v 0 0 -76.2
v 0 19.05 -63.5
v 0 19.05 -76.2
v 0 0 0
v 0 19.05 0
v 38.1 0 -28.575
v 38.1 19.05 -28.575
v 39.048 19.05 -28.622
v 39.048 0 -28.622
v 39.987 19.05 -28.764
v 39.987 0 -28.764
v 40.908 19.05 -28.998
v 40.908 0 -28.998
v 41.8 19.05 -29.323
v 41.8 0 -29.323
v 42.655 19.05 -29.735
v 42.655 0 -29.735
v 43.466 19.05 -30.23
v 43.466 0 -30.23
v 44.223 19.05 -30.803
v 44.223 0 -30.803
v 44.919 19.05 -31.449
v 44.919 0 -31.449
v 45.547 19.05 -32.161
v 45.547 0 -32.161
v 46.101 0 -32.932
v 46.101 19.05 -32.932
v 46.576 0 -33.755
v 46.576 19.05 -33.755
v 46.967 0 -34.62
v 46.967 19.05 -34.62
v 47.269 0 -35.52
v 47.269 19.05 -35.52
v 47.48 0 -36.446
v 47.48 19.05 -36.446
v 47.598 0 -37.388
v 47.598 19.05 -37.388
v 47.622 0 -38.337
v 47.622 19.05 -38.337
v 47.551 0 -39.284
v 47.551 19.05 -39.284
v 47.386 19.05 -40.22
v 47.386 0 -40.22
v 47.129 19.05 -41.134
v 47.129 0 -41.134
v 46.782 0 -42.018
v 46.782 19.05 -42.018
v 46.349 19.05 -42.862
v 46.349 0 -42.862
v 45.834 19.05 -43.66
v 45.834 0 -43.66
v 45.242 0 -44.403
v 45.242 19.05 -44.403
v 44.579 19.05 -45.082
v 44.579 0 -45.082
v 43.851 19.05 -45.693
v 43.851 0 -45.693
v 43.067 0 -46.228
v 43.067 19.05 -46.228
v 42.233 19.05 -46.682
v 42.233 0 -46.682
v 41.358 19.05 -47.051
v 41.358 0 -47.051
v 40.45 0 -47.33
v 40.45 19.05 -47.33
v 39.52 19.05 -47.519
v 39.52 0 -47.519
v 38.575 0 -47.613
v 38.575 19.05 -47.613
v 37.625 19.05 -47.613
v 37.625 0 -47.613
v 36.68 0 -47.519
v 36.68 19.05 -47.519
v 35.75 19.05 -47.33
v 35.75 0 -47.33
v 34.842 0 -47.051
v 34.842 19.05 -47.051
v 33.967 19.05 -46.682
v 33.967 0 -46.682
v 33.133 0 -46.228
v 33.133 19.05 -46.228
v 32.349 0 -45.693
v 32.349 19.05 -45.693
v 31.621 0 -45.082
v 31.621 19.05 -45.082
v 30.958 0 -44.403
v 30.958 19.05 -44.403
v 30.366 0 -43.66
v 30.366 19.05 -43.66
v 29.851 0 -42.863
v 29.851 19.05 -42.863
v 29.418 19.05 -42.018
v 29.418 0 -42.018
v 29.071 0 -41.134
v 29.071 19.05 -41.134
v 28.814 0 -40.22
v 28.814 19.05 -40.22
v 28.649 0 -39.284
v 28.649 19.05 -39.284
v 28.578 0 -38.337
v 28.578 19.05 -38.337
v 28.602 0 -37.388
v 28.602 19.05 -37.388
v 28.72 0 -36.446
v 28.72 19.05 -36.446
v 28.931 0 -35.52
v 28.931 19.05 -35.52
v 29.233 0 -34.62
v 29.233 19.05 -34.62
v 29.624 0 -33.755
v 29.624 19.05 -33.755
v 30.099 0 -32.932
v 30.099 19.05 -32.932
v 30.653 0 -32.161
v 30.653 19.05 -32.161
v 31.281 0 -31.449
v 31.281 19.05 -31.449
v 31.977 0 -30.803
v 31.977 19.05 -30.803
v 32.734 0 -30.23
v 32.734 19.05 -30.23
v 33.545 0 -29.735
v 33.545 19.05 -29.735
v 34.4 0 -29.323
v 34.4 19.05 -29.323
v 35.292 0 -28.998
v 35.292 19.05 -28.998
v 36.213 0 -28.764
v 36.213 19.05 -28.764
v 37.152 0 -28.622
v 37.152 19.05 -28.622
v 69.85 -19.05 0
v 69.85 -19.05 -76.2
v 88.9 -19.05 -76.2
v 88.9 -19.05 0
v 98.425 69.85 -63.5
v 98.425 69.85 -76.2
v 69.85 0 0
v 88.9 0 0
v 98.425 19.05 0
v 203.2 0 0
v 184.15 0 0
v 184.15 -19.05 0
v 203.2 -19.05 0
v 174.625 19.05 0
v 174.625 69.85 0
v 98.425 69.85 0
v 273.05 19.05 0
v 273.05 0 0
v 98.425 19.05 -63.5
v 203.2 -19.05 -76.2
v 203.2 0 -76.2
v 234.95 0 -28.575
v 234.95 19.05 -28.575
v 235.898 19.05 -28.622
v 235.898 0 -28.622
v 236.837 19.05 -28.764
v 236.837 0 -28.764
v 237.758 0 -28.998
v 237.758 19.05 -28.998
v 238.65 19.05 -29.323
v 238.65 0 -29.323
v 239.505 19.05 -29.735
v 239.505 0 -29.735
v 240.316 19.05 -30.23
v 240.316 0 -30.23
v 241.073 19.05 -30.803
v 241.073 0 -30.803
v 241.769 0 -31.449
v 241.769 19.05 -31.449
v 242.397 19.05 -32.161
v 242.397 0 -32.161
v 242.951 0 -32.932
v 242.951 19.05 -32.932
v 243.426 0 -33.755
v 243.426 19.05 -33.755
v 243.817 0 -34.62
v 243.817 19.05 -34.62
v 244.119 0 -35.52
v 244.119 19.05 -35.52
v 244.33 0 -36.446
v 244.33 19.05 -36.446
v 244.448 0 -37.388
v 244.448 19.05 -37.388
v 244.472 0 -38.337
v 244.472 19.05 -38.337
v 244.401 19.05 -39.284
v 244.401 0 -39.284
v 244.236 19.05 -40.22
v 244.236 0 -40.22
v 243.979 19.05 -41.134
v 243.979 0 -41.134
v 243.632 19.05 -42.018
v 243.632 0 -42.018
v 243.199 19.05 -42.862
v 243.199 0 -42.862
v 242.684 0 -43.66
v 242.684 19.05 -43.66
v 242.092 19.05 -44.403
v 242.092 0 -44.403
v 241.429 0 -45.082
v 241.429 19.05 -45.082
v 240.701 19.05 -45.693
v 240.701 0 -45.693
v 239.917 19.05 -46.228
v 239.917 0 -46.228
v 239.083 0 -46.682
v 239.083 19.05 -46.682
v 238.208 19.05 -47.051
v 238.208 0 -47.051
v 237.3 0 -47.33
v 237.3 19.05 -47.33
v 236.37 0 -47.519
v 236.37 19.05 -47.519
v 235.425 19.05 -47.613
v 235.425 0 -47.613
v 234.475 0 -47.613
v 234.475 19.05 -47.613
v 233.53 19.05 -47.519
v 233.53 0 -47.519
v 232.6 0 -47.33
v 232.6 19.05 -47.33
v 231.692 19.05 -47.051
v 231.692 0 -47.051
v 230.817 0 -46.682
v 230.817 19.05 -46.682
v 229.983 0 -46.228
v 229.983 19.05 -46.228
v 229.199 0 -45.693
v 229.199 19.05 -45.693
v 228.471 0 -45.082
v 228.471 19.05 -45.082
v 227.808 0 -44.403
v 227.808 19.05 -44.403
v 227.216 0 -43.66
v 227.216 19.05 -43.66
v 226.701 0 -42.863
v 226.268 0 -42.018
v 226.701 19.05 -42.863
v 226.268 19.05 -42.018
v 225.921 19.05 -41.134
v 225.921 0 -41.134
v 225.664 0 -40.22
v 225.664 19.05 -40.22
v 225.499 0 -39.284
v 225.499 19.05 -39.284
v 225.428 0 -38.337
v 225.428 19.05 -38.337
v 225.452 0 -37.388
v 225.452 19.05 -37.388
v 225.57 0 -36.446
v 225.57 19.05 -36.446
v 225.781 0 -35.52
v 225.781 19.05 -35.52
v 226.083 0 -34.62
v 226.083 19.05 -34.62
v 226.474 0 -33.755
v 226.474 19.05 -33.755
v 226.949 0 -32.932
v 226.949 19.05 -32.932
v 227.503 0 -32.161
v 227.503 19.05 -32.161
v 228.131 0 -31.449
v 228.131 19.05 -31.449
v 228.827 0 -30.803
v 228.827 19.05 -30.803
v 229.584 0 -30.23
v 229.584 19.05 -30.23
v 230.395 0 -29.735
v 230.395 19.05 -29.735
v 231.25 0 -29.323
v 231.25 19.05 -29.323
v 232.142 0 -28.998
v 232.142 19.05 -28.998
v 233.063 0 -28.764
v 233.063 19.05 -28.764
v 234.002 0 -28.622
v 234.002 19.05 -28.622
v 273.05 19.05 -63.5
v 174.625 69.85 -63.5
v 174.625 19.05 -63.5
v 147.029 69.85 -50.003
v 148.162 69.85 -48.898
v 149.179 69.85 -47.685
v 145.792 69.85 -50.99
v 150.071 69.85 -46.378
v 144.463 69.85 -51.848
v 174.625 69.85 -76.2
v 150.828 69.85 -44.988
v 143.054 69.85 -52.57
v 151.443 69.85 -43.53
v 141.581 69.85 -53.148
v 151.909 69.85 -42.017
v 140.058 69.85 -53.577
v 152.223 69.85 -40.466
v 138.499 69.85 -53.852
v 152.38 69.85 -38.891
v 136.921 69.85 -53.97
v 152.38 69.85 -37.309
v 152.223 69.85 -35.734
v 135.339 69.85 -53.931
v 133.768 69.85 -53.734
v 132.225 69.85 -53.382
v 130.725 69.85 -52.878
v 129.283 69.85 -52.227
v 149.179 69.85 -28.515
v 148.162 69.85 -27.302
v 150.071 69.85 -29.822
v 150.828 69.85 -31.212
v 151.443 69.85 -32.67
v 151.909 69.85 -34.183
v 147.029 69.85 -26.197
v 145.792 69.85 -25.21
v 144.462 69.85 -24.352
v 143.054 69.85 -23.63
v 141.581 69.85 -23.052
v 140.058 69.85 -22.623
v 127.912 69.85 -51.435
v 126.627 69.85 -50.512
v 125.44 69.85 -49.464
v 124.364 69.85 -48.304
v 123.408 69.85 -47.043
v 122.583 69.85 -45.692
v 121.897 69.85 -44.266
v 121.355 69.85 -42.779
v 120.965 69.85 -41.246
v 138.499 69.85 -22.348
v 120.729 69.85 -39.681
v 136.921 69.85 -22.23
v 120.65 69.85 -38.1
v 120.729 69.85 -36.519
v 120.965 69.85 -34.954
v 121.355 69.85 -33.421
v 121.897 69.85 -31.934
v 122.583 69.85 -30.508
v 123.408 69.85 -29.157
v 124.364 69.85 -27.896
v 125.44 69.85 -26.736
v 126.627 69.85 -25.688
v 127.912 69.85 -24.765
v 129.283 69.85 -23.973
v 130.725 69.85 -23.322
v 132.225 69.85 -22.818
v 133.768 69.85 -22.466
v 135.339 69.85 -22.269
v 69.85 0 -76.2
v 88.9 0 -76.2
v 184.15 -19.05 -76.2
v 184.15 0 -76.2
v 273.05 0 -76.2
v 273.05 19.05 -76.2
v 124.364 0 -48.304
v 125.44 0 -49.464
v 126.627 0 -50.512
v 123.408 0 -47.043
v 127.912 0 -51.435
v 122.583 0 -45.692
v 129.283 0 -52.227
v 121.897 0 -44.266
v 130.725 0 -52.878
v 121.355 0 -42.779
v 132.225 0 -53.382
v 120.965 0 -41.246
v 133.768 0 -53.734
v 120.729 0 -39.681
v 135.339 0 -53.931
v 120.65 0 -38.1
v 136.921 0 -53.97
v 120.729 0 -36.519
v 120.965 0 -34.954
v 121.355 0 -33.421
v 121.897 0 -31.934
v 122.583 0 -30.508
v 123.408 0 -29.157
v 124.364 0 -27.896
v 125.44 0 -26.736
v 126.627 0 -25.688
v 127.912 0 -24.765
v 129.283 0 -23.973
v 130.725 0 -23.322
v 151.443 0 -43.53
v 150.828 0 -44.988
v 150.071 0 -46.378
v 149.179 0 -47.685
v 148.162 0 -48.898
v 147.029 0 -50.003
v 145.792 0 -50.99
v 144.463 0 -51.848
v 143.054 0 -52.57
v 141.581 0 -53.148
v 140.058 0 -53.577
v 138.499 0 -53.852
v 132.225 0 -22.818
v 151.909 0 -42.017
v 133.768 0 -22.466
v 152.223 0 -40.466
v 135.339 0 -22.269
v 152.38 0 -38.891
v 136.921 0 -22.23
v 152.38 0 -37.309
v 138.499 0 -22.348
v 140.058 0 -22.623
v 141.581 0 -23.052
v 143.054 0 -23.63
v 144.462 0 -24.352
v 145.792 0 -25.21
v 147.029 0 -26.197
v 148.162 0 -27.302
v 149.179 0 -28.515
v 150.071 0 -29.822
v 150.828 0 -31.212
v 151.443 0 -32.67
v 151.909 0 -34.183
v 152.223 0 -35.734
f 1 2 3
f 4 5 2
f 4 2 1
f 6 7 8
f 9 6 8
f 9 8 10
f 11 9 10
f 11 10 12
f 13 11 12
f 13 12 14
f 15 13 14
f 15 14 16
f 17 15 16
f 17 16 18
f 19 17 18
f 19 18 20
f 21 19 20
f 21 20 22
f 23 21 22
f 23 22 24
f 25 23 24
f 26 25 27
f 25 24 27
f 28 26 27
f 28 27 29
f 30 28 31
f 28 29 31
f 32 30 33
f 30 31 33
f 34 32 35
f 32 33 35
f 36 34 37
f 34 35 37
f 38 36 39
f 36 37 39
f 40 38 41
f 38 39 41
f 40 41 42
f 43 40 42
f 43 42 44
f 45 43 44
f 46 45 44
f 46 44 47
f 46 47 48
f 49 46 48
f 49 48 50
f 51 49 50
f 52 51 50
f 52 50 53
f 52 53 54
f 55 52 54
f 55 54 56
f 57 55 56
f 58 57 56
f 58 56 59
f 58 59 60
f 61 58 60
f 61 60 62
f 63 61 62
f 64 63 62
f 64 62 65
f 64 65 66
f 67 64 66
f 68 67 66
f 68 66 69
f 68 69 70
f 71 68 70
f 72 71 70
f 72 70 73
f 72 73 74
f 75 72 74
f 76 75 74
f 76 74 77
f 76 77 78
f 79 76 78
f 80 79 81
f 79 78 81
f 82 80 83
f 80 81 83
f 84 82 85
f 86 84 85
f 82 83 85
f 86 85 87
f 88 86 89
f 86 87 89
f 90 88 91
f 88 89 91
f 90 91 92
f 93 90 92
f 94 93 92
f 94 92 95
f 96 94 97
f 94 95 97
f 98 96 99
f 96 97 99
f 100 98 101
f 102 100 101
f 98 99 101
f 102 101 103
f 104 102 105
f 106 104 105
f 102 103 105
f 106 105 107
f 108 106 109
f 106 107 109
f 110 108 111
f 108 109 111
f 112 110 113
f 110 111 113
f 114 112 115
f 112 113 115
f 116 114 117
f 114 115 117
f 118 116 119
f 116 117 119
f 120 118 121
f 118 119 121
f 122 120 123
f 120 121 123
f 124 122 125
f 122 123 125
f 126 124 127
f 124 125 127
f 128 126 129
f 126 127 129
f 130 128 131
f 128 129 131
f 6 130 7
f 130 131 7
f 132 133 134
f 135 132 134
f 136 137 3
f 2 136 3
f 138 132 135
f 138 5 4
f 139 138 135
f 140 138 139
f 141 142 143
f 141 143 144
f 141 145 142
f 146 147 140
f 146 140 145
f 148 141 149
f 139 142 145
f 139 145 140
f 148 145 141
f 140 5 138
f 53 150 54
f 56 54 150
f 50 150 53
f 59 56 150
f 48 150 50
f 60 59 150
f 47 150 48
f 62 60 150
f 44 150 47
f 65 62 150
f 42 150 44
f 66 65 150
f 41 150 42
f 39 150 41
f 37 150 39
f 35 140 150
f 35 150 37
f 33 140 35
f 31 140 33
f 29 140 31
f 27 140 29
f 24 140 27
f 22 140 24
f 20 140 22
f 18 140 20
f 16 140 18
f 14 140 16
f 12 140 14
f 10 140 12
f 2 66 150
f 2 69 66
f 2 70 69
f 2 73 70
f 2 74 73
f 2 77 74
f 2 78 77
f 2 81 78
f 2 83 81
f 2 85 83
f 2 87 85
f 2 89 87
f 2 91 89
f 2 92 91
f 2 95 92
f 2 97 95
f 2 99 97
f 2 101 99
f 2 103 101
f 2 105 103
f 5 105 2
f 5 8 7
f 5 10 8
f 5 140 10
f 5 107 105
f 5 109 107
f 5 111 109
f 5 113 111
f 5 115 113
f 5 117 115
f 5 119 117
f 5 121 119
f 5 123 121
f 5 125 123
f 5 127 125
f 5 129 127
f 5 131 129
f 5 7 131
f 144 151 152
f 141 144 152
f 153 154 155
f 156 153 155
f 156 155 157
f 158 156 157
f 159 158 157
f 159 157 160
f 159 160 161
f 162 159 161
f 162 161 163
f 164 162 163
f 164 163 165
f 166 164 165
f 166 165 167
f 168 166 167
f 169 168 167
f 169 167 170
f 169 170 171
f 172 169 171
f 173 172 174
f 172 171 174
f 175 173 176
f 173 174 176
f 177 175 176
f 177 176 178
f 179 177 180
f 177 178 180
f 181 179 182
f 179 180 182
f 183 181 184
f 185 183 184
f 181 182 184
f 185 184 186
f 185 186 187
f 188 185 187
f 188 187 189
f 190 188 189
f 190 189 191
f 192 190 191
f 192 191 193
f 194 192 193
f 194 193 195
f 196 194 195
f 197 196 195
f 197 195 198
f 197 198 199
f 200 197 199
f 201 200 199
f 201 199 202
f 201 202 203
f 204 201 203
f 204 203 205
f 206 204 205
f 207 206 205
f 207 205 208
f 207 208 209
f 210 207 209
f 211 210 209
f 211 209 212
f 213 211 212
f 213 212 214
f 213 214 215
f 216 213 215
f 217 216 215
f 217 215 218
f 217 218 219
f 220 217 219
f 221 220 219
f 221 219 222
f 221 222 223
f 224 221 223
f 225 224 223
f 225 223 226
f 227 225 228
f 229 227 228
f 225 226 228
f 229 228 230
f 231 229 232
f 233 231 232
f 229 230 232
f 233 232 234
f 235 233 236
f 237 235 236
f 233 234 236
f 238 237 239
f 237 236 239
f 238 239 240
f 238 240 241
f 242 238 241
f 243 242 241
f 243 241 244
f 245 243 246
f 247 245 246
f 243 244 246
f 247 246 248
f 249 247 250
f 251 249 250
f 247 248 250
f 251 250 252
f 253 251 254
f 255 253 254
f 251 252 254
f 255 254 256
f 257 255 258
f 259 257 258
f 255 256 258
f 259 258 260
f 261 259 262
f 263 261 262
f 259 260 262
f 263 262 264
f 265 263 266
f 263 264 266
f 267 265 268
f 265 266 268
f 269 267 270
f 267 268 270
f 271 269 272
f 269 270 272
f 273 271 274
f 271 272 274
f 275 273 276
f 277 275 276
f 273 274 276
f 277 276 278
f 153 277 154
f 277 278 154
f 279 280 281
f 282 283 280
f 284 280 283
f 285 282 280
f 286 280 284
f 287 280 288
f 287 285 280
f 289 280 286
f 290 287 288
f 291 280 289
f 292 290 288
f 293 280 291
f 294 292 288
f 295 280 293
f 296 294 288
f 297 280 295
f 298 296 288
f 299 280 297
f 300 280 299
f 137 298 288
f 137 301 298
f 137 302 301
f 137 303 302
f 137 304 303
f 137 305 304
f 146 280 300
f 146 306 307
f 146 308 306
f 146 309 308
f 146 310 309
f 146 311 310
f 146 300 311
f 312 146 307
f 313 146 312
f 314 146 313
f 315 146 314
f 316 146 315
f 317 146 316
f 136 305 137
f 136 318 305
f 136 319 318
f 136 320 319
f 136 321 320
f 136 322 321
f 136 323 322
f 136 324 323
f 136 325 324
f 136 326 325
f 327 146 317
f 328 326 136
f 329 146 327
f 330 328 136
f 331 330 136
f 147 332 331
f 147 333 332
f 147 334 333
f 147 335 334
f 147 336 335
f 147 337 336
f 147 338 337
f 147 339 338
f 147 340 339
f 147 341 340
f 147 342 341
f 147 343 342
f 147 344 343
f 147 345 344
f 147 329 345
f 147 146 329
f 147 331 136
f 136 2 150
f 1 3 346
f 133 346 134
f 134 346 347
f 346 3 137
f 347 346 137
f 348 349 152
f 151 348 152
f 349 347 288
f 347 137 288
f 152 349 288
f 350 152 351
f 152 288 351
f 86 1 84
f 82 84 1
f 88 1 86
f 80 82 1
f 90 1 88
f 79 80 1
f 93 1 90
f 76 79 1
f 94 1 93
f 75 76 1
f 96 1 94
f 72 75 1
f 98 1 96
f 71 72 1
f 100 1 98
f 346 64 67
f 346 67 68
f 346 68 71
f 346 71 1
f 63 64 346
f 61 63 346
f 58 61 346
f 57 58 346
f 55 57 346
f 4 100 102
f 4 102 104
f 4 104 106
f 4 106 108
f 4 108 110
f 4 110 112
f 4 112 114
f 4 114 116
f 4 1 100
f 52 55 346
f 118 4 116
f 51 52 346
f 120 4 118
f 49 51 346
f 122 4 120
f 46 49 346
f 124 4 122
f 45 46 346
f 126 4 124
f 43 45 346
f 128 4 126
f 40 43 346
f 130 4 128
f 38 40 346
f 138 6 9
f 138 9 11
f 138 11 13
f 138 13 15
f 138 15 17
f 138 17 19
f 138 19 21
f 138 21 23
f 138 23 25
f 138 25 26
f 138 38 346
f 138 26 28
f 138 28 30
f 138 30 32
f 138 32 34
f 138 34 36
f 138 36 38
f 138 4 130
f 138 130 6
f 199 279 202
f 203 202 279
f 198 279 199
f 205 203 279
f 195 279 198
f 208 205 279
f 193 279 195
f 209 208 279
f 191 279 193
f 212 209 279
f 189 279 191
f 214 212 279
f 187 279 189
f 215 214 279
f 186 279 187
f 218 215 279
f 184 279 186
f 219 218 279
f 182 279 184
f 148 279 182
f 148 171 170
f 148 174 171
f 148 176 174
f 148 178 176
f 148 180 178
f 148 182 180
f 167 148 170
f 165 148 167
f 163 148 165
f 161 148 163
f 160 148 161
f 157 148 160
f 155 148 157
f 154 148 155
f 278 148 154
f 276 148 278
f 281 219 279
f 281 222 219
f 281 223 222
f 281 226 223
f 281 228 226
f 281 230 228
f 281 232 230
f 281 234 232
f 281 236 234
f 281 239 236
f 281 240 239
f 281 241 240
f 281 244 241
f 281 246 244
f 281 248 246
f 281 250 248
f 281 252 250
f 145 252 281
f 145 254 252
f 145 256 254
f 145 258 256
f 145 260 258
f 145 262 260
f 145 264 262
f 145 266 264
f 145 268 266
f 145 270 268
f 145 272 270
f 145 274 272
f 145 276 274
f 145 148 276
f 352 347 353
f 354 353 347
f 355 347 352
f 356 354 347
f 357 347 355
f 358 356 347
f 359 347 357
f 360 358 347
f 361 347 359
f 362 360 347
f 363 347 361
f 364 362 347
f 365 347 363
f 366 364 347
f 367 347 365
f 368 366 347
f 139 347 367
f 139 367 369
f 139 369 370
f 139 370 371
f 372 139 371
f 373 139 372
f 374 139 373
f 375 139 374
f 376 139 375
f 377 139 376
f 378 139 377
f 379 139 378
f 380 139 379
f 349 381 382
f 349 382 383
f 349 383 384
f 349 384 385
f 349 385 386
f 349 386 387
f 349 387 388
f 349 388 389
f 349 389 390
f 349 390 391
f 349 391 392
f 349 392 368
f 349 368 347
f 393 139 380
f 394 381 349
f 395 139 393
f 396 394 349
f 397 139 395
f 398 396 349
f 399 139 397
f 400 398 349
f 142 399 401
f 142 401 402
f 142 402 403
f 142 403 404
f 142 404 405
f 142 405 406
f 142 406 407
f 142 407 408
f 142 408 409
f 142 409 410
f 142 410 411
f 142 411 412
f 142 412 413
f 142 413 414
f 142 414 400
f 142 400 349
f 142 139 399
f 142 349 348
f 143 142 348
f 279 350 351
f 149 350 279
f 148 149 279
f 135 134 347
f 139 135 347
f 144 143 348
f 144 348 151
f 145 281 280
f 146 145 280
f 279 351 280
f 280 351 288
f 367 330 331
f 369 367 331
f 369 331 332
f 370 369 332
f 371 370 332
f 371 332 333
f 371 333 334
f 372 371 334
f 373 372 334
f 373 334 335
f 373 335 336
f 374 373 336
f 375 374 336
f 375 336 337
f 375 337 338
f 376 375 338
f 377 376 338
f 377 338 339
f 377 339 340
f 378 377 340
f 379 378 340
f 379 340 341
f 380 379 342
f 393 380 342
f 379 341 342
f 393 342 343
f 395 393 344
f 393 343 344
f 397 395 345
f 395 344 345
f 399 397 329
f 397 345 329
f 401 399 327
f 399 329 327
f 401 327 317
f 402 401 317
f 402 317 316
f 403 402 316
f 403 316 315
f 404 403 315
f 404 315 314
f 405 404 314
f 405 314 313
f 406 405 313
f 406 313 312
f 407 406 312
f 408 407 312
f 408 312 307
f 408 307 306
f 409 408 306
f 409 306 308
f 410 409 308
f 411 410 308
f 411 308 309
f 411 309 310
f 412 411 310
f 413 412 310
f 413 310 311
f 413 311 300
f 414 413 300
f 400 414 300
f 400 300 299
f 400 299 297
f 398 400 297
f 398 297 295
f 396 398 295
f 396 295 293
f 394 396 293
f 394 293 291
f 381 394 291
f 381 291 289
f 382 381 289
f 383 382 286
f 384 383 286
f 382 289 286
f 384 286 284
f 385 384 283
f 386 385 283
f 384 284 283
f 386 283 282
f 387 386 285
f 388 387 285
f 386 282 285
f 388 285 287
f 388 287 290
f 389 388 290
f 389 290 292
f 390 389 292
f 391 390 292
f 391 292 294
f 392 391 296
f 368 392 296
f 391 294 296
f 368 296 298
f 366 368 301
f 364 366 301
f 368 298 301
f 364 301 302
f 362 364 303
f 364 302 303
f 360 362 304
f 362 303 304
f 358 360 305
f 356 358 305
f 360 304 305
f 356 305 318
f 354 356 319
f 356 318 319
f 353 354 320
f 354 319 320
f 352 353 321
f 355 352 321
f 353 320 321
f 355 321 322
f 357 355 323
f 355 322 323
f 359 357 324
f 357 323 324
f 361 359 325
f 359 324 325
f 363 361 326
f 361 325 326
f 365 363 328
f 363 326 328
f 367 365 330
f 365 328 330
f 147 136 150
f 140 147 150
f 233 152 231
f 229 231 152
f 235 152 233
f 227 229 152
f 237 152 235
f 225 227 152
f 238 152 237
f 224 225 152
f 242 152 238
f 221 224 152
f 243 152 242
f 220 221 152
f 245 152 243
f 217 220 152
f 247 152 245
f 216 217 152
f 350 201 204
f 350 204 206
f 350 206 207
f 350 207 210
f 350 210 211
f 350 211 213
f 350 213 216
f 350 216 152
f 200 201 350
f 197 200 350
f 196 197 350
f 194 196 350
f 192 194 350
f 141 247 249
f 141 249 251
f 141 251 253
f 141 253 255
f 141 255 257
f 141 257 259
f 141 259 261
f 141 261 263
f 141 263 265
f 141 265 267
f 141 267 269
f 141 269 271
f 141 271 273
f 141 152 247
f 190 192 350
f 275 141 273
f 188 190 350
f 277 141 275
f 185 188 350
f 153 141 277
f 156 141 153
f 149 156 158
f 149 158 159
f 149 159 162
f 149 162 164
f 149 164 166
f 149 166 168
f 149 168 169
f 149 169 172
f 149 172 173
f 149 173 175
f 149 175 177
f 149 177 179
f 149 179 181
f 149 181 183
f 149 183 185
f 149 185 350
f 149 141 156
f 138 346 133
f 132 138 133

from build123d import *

# Parameters (mm, degrees)
BOSS_EXTRUDE1_DEPTH = 76.2
BOSS_EXTRUDE2_DEPTH = 12.7
SKETCH3_R           = 15.875
CUT_EXTRUDE1_DEPTH  = 298.095864158
SKETCH4_R           = 9.525
CUT_EXTRUDE2_DEPTH  = 288.998927949


with BuildPart() as part:
    # Sketch1 → Boss-Extrude1 (new body)
    with BuildSketch(Plane.XY):
        Polygon((0, 0), (69.85, 0), (69.85, -19.05), (88.9, -19.05), (88.9, 0), (184.15, 0), (184.15, -19.05), (203.2, -19.05), (203.2, 0), (273.05, 0), (273.05, 19.05), (174.625, 19.05), (174.625, 69.85), (98.425, 69.85), (98.425, 19.05), (0, 19.05), align=None)
    extrude(amount=-BOSS_EXTRUDE1_DEPTH)

    # Sketch2 → Boss-Extrude2 (add)
    with BuildSketch(Plane(origin=(0, 0, -76.2), x_dir=(-1, 0, 0), z_dir=(0, 0, -1))):
        Polygon((-98.425, 69.85), (0, 19.05), (-98.425, 19.05), align=None)
        Polygon((-273.05, 19.05), (-174.625, 69.85), (-174.625, 19.05), align=None)
    extrude(amount=-BOSS_EXTRUDE2_DEPTH)

    # Sketch3 → Cut-Extrude1 (cut, through all)
    with BuildSketch(Plane(origin=(0, 69.85, 0), x_dir=(1, 0, 0), z_dir=(0, 1, 0))):
        with Locations(Location((136.525, 38.1, 0), (0, 0, 180))):
            Circle(SKETCH3_R)
    extrude(amount=-CUT_EXTRUDE1_DEPTH, mode=Mode.SUBTRACT)

    # Sketch4 → Cut-Extrude2 (cut, through all)
    with BuildSketch(Plane(origin=(0, 19.05, 0), x_dir=(1, 0, 0), z_dir=(0, 1, 0))):
        with Locations(Location((234.95, 38.1, 0), (0, 0, 270))):
            Circle(SKETCH4_R)
        with Locations(Location((38.1, 38.1, 0), (0, 0, 270))):
            Circle(SKETCH4_R)
    extrude(amount=-CUT_EXTRUDE2_DEPTH, mode=Mode.SUBTRACT)


solid = part.part
